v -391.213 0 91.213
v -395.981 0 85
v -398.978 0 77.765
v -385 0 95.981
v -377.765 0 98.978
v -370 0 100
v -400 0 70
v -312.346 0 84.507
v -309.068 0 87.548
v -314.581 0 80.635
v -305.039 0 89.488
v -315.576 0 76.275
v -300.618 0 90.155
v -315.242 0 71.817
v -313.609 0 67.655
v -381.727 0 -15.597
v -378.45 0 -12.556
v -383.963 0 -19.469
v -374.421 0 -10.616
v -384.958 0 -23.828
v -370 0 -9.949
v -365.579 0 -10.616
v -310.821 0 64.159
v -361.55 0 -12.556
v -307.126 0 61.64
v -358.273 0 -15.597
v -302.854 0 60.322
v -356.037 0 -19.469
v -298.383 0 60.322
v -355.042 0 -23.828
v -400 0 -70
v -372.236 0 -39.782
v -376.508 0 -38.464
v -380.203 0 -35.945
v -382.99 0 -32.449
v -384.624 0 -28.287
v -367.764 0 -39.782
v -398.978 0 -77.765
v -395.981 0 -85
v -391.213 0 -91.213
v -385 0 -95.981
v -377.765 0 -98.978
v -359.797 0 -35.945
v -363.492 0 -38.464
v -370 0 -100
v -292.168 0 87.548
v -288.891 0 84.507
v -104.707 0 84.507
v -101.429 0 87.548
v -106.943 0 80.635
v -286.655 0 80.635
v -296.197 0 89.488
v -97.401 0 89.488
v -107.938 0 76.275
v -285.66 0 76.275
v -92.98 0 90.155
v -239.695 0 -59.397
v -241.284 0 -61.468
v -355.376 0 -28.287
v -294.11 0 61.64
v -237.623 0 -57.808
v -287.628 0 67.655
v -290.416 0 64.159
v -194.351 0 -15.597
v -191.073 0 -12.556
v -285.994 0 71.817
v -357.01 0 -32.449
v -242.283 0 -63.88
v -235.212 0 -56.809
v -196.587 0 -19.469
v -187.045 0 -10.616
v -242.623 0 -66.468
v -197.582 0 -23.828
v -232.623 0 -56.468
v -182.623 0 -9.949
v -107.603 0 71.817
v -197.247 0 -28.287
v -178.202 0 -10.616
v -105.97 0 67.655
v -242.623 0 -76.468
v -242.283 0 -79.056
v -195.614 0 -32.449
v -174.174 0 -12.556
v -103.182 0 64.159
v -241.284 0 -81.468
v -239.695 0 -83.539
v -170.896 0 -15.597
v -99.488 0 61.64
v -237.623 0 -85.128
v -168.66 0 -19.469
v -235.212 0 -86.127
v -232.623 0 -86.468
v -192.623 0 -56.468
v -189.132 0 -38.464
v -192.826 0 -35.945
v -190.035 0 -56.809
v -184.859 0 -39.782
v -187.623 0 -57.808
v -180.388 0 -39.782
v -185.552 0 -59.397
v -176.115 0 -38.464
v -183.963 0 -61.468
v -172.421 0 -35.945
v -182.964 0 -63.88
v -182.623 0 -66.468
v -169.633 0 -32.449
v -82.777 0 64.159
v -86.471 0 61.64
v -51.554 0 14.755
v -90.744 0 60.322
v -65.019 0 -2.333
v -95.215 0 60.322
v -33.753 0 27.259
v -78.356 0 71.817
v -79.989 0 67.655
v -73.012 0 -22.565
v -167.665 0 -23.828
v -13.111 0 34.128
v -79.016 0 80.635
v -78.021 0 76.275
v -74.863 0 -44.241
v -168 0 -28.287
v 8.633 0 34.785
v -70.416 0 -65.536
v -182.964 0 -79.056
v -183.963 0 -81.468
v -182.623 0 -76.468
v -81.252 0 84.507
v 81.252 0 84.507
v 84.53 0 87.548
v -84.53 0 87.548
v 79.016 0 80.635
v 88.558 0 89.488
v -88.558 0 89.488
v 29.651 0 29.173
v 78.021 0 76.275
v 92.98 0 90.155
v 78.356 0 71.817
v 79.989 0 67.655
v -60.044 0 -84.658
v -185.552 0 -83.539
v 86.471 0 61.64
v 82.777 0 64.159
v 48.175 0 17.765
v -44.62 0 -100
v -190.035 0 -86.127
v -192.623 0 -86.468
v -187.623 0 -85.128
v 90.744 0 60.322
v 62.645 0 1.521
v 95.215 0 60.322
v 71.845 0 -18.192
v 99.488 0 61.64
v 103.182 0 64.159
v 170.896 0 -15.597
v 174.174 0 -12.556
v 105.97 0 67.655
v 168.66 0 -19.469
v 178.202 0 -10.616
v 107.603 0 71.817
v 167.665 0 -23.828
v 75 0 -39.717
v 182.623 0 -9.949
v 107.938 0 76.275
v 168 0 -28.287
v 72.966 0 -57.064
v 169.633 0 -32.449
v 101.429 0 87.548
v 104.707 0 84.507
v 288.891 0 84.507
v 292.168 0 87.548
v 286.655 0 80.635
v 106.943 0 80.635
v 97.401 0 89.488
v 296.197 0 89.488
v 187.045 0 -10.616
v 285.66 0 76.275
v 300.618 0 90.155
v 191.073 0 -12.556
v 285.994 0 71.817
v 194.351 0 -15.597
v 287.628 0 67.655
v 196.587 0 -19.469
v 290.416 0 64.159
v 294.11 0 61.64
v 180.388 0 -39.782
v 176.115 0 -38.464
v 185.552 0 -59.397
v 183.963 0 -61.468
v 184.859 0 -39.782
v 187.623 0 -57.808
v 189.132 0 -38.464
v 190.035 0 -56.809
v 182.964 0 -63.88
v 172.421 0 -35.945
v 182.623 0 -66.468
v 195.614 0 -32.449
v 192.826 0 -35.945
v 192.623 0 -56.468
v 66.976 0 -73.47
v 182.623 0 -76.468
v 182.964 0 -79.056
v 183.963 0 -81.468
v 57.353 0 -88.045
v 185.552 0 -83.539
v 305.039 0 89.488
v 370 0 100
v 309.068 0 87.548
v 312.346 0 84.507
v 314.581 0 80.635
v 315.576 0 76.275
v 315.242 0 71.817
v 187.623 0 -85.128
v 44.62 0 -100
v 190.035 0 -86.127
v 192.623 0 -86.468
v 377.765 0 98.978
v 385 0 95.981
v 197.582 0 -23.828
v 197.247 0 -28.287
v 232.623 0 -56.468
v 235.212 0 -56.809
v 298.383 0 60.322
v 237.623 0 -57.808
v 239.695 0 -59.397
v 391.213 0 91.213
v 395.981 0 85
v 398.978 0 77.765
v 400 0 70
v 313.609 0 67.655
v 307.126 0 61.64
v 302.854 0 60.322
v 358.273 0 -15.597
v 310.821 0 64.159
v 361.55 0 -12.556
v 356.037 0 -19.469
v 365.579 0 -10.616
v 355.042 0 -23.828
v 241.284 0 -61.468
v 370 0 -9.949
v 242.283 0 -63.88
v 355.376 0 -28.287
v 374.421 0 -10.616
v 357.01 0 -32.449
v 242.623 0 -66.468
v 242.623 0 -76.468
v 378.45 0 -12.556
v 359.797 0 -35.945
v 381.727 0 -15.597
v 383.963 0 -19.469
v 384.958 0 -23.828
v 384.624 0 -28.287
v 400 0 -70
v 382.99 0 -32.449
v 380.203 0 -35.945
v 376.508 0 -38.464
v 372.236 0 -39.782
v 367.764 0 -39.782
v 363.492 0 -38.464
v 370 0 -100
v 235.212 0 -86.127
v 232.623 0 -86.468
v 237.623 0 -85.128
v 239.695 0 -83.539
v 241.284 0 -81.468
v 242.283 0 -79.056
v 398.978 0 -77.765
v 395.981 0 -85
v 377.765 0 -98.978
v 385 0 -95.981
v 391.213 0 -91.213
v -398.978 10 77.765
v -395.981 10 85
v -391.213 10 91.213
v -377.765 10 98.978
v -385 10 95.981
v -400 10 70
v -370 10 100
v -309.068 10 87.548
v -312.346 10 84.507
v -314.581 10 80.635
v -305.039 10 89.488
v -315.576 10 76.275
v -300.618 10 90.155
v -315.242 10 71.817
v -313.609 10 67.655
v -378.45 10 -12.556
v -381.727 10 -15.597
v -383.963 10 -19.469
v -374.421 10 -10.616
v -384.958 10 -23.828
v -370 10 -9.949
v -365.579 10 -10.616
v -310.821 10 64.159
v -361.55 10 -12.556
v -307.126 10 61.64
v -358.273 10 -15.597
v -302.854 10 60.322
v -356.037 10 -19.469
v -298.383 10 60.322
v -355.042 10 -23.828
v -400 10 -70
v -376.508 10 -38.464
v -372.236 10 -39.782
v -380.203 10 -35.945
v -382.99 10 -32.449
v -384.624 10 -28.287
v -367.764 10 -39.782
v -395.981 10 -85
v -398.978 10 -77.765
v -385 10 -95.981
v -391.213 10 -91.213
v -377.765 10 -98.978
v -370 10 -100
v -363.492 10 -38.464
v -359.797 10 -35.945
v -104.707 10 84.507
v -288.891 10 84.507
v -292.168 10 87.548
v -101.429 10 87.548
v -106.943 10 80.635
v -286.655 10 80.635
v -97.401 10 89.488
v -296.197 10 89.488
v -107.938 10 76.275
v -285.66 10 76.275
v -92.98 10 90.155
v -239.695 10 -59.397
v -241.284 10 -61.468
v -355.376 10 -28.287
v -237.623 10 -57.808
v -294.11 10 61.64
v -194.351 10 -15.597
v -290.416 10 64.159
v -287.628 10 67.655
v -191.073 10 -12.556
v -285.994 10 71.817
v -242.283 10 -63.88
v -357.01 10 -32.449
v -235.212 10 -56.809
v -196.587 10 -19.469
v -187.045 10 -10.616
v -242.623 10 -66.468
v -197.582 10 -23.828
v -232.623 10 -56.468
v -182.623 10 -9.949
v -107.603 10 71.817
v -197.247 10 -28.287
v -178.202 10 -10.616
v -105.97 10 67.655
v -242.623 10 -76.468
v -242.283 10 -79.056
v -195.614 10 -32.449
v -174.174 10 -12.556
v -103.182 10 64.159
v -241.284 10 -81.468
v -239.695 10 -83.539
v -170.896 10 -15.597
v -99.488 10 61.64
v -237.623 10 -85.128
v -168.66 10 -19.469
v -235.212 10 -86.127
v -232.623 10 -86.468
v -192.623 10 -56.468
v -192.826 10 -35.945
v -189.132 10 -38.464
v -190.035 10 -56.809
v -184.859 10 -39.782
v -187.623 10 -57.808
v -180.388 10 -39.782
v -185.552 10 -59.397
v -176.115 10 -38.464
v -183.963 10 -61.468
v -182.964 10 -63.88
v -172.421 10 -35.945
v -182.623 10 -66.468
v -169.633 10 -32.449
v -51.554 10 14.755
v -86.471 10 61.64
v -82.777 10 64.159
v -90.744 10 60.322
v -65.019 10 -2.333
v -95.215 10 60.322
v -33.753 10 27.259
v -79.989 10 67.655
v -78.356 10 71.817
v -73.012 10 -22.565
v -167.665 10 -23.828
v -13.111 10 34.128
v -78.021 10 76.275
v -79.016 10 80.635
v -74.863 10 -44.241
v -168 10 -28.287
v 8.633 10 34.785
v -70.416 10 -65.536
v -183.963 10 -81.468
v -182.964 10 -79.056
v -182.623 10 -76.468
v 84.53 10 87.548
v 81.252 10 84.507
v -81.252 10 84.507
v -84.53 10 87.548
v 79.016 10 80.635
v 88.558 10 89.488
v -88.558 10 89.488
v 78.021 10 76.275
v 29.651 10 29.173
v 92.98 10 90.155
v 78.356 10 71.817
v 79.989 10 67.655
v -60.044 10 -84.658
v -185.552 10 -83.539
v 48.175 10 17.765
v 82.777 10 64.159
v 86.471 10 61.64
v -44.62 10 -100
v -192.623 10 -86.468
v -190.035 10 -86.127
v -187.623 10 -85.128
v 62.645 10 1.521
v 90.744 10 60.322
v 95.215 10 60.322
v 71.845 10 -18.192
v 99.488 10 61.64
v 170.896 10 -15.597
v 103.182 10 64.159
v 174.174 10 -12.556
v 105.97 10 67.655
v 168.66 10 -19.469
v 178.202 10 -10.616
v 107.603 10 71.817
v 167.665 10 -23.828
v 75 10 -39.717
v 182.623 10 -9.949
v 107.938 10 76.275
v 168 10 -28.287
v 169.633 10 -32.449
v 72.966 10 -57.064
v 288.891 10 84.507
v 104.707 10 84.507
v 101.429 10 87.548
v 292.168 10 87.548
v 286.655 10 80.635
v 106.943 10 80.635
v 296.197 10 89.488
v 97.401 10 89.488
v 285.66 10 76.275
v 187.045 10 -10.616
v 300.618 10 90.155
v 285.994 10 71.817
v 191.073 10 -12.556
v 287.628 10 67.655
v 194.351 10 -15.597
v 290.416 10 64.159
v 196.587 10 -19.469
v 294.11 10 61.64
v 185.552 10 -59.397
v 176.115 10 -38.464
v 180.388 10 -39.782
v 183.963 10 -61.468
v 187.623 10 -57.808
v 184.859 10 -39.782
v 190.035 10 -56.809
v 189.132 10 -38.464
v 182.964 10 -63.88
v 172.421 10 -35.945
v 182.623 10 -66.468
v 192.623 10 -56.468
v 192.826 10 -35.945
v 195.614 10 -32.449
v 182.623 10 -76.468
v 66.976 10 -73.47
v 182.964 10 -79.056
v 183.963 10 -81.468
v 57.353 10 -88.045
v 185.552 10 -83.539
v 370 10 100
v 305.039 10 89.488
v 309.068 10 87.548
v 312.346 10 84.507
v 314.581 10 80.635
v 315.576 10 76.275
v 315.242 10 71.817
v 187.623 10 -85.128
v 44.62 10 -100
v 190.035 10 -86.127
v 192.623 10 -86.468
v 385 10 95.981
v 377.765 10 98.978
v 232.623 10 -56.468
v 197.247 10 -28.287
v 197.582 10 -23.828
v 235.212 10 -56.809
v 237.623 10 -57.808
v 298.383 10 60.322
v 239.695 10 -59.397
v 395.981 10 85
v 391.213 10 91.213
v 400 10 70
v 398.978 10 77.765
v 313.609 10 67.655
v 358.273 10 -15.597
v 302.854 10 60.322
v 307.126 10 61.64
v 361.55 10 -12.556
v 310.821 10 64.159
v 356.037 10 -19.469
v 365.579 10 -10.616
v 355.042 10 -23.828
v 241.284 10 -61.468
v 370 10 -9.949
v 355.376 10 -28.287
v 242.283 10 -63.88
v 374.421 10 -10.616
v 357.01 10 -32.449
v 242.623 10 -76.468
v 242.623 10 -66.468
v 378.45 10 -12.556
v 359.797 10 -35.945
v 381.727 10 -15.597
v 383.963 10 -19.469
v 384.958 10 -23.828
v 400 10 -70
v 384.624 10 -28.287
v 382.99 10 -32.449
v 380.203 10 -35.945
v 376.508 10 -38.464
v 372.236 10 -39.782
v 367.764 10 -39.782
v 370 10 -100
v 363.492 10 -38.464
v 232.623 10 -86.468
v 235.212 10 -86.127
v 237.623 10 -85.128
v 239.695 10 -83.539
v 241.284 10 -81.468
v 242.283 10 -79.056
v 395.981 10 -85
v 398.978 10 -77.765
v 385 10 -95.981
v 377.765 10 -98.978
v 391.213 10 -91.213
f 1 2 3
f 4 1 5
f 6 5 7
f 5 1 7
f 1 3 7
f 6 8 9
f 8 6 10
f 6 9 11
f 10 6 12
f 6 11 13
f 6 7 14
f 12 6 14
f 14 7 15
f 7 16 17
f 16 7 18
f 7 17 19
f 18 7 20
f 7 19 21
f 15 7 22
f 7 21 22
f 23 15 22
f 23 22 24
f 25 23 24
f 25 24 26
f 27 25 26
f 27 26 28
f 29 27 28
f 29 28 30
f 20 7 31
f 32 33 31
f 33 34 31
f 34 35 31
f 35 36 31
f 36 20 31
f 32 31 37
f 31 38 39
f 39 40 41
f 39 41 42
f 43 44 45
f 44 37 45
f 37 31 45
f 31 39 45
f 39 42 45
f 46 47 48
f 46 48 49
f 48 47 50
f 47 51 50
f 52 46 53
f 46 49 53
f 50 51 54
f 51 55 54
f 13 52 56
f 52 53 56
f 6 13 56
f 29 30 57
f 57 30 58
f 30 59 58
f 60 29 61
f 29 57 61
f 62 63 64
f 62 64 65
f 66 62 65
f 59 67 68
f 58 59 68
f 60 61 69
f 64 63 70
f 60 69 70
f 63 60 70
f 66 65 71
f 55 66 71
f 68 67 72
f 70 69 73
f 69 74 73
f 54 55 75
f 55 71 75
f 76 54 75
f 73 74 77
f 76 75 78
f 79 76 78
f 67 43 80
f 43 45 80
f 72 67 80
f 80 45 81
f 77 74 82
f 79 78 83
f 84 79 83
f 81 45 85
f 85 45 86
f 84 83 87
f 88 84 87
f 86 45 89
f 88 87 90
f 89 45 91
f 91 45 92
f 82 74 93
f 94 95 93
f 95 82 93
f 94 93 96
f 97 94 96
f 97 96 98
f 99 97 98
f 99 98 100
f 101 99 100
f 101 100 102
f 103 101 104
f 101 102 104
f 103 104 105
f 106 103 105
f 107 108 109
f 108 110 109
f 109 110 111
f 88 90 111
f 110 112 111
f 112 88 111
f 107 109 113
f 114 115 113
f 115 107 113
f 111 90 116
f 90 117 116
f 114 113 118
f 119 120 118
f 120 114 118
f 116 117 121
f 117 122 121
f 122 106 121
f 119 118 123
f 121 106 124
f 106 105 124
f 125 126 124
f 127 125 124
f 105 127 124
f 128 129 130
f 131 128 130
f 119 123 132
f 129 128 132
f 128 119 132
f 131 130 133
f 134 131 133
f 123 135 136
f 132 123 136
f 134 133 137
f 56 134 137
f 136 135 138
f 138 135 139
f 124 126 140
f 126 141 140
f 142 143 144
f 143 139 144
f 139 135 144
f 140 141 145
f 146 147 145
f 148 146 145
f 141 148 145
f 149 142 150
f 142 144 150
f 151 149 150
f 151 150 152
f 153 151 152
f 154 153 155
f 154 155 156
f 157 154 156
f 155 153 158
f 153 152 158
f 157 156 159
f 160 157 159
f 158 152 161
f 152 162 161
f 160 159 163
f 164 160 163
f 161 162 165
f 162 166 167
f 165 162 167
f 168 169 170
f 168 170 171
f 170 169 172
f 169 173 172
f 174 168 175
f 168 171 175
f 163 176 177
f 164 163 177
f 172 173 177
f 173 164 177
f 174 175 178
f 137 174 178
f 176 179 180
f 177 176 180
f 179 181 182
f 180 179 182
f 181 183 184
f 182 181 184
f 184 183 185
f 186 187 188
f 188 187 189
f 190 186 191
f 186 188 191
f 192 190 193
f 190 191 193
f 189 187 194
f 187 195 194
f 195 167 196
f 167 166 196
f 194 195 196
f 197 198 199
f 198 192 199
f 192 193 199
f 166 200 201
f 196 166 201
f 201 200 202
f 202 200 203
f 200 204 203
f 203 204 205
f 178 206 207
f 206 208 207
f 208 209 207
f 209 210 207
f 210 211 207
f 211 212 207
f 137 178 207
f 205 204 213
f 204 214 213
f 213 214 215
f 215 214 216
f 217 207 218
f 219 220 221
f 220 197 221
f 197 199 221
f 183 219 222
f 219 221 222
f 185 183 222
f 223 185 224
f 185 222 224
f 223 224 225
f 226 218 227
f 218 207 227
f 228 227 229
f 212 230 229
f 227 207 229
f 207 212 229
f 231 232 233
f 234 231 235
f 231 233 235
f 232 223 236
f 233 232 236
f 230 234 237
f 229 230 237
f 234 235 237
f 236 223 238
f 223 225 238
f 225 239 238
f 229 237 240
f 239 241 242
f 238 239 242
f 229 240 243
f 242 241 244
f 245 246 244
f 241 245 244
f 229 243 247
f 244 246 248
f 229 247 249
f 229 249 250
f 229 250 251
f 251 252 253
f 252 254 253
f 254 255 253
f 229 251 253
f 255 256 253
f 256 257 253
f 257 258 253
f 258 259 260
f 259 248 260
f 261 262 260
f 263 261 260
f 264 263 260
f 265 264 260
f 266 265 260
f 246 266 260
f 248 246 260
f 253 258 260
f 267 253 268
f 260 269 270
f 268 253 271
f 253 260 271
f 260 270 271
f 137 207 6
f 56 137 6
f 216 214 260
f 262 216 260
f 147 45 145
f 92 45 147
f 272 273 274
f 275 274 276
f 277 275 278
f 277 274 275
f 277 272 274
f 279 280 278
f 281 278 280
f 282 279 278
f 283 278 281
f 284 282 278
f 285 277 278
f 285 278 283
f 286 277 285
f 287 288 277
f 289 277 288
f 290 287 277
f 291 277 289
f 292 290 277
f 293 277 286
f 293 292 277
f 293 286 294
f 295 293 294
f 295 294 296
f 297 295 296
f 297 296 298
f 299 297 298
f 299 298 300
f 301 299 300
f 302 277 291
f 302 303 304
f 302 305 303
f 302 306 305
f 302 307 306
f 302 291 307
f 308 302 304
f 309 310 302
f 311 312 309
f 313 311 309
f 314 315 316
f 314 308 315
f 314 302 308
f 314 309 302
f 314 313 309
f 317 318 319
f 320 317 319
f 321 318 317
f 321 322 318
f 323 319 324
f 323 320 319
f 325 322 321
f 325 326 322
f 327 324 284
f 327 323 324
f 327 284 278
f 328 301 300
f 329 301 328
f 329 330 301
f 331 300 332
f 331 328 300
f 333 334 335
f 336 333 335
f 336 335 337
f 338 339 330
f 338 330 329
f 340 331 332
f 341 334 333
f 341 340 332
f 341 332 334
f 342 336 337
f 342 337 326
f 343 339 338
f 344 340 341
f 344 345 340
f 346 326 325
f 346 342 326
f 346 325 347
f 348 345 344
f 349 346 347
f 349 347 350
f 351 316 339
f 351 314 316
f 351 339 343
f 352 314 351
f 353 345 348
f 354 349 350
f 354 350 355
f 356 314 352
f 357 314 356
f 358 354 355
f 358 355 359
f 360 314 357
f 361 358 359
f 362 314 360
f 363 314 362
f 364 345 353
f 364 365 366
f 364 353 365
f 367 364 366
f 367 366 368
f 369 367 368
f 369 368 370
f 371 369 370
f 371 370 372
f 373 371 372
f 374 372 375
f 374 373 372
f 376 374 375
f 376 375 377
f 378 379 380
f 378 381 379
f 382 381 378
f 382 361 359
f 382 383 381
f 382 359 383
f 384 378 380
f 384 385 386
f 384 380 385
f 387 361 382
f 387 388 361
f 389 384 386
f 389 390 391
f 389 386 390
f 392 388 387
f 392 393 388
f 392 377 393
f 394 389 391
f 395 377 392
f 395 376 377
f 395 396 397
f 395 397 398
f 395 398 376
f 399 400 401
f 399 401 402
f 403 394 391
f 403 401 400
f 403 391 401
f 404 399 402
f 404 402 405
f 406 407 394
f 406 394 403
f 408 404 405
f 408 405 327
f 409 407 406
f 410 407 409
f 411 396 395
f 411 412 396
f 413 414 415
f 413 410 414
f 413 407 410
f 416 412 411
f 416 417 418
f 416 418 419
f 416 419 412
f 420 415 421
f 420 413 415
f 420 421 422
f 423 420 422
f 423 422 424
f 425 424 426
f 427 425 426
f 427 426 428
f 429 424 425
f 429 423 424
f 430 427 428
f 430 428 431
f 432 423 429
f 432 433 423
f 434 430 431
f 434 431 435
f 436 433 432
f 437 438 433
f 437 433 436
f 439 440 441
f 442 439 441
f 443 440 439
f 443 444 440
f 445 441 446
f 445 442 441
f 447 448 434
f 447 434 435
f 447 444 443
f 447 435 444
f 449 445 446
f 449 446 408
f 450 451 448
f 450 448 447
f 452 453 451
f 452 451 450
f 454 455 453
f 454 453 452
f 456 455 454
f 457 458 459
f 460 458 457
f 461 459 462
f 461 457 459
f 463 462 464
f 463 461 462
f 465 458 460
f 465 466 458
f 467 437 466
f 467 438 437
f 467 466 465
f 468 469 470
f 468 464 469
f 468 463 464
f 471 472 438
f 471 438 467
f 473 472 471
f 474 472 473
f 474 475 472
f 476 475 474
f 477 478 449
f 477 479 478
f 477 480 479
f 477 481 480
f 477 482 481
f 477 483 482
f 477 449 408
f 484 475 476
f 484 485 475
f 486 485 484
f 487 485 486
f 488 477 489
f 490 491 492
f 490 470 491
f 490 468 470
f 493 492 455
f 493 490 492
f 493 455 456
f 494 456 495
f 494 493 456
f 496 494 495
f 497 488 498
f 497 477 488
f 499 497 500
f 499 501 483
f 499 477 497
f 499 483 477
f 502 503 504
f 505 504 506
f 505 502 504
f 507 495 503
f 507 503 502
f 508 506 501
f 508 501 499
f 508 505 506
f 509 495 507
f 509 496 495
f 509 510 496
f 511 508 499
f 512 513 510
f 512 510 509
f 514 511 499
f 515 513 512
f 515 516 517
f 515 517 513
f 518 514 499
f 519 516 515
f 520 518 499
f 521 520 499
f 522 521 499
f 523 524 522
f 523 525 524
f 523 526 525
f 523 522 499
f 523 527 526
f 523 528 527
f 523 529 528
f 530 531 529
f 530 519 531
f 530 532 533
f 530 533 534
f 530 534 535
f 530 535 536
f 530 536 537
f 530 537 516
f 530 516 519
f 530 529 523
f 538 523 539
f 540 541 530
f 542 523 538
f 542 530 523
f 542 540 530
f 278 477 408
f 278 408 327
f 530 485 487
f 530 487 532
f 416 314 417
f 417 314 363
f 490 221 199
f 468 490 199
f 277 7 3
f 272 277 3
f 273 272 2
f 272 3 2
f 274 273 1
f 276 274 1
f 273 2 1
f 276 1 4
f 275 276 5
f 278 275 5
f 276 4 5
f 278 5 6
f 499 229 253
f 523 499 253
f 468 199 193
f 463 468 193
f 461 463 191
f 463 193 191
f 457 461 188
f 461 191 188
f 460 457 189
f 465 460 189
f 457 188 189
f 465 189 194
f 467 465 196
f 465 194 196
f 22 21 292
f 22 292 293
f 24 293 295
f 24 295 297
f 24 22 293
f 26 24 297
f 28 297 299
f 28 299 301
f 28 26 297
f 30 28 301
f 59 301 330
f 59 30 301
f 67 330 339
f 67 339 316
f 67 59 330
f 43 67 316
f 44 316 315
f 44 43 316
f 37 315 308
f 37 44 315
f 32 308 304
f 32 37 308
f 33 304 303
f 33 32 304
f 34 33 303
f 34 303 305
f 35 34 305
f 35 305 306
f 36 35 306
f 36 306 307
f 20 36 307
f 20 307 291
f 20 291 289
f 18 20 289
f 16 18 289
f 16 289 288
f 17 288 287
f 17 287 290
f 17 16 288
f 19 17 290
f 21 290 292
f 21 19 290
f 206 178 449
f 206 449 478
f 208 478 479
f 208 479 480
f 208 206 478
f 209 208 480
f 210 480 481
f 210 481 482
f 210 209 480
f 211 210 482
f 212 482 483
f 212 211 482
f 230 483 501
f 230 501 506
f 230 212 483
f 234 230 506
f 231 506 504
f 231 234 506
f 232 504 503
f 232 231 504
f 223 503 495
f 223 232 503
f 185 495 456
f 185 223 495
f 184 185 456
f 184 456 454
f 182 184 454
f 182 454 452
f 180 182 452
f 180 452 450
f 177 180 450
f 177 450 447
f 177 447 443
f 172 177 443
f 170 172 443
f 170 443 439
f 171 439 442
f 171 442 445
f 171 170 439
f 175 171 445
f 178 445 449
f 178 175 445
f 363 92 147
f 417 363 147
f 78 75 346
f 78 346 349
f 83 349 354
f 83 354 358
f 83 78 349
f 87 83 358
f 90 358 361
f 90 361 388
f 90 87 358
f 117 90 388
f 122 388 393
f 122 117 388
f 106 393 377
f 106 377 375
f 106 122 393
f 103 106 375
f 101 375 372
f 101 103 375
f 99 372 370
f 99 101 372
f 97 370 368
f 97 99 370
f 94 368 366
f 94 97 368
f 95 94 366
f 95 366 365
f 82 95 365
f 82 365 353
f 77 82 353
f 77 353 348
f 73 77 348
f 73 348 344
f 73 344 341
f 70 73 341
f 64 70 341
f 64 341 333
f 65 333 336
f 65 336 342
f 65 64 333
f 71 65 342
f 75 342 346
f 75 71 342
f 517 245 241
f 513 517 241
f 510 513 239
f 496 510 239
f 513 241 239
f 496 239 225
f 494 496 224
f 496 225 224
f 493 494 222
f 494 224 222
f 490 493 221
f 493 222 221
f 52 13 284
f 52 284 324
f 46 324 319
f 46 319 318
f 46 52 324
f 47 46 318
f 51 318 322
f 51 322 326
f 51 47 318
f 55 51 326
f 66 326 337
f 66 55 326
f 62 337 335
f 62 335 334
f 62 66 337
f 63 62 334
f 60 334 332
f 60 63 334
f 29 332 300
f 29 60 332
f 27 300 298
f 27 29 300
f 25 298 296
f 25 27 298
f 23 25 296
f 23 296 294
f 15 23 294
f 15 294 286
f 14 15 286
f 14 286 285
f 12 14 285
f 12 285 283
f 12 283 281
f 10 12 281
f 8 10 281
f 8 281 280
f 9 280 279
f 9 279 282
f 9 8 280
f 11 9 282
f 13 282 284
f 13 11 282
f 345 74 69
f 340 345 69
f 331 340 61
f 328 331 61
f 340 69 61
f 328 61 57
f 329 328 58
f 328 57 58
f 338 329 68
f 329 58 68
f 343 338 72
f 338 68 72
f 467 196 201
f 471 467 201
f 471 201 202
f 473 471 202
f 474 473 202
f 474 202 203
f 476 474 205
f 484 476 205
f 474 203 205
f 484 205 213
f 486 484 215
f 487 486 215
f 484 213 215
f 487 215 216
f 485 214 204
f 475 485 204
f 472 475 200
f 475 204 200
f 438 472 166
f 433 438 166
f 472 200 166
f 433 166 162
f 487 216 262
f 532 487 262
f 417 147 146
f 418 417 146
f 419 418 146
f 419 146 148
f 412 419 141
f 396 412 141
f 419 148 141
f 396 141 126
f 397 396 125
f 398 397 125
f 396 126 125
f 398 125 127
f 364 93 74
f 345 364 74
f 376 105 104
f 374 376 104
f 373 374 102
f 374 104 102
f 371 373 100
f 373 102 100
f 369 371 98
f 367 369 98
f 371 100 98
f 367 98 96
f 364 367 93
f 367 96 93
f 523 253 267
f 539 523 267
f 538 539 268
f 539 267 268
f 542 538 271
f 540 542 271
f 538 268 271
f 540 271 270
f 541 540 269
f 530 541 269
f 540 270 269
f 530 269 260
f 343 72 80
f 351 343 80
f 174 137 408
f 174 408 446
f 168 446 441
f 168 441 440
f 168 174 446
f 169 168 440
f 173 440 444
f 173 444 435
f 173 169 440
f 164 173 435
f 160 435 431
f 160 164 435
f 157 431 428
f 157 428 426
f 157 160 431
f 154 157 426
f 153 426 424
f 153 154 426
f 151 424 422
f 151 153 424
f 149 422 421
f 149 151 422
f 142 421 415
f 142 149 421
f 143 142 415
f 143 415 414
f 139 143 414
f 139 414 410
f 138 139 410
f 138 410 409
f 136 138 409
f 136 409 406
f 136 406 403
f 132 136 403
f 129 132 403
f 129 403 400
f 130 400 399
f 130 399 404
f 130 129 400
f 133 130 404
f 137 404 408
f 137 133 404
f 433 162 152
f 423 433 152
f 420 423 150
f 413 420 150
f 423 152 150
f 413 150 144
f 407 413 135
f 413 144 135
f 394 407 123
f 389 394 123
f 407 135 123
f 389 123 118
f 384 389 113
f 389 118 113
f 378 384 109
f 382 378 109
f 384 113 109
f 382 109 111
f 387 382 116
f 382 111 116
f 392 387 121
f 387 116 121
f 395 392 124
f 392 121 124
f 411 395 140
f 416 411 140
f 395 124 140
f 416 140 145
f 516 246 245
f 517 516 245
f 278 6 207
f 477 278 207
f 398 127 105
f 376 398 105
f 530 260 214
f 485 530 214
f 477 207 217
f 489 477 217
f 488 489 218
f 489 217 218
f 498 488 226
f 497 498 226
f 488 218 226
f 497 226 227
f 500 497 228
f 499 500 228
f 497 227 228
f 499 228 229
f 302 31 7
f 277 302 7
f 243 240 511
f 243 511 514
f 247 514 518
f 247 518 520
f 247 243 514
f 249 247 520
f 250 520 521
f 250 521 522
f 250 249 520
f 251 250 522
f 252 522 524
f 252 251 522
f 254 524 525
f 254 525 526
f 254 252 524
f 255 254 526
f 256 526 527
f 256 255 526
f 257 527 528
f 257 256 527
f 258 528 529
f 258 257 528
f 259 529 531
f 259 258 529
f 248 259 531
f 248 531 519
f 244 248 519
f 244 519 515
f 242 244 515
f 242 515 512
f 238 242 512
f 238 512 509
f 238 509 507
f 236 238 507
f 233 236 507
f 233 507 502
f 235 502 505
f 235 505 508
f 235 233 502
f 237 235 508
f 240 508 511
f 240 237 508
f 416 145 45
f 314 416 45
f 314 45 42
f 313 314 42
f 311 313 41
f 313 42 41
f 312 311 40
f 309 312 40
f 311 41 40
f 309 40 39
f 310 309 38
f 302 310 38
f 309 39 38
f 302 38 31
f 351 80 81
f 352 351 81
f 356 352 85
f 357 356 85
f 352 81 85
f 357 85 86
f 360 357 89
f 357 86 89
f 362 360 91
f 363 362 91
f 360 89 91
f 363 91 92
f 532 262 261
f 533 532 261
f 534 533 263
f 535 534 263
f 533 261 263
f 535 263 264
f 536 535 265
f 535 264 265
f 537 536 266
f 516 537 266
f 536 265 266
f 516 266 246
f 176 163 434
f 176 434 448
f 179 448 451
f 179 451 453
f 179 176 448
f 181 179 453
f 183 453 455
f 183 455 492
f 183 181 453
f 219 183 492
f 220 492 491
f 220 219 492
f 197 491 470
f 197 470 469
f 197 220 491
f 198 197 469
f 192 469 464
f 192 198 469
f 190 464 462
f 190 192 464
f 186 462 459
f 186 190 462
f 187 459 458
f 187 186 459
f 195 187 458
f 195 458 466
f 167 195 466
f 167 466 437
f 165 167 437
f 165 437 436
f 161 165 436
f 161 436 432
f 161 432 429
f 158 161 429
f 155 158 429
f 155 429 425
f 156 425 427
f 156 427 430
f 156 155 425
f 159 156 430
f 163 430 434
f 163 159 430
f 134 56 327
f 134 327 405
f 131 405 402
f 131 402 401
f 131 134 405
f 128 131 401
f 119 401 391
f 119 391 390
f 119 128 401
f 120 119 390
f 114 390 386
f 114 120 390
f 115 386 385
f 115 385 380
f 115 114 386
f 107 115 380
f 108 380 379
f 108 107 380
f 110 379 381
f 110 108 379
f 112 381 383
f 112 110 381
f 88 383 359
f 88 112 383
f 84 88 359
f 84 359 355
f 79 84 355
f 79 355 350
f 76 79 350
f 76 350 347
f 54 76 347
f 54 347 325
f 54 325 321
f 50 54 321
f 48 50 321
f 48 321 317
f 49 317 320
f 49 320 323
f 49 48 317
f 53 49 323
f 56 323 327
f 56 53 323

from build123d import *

# Parameters (mm, degrees)
SKETCH1_R           = 15
BOSS_EXTRUDE1_DEPTH = 10


with BuildPart() as part:
    # Sketch1 → Boss-Extrude1 (new body)
    with BuildSketch(Plane(origin=(0, 0, 0), x_dir=(1, 0, 0), z_dir=(0, 1, 0))):
        with BuildLine():
            Line((-370, -100), (370, -100))
            ThreePointArc((370, -100), (391.213203436, -91.213203436), (400, -70))
            Line((400, -70), (400, 70))
            ThreePointArc((400, 70), (391.213203436, 91.213203436), (370, 100))
            Line((370, 100), (44.619962618, 100))
            ThreePointArc((44.619962618, 100), (66.975731412, 73.469642109), (75, 39.716843679))
            ThreePointArc((75, 39.716843679), (-33.75279843, -27.258887733), (-44.619962618, 100))
            Line((-44.619962618, 100), (-370, 100))
            ThreePointArc((-370, 100), (-391.213203436, 91.213203436), (-400, 70))
            Line((-400, 70), (-400, -70))
            ThreePointArc((-400, -70), (-391.213203436, -91.213203436), (-370, -100))
        make_face()
        with Locations(Location((-300.6181604, -75.1545401, 0), (0, 0, 270))):
            Circle(SKETCH1_R, mode=Mode.SUBTRACT)
        with Locations(Location((-92.979550381, -75.1545401, 0), (0, 0, 270))):
            Circle(SKETCH1_R, mode=Mode.SUBTRACT)
        with Locations(Location((92.979550381, -75.1545401, 0), (0, 0, 270))):
            Circle(SKETCH1_R, mode=Mode.SUBTRACT)
        with Locations(Location((300.6181604, -75.1545401, 0), (0, 0, 270))):
            Circle(SKETCH1_R, mode=Mode.SUBTRACT)
        with Locations(Location((-370, 24.949199623, 0), (0, 0, 270))):
            Circle(SKETCH1_R, mode=Mode.SUBTRACT)
        with Locations(Location((-182.623487934, 24.949199623, 0), (0, 0, 270))):
            Circle(SKETCH1_R, mode=Mode.SUBTRACT)
        with BuildLine():
            ThreePointArc((-242.623487934, 76.468107678), (-239.694555745, 83.53917549), (-232.623487934, 86.468107678))
            Line((-232.623487934, 86.468107678), (-192.623487934, 86.468107678))
            ThreePointArc((-192.623487934, 86.468107678), (-185.552420122, 83.53917549), (-182.623487934, 76.468107678))
            Line((-182.623487934, 76.468107678), (-182.623487934, 66.468107678))
            ThreePointArc((-182.623487934, 66.468107678), (-185.552420122, 59.397039866), (-192.623487934, 56.468107678))
            Line((-192.623487934, 56.468107678), (-232.623487934, 56.468107678))
            ThreePointArc((-232.623487934, 56.468107678), (-239.694555745, 59.397039866), (-242.623487934, 66.468107678))
            Line((-242.623487934, 66.468107678), (-242.623487934, 76.468107678))
        make_face(mode=Mode.SUBTRACT)
        with Locations(Location((182.623487934, 24.949199623, 0), (0, 0, 270))):
            Circle(SKETCH1_R, mode=Mode.SUBTRACT)
        with Locations(Location((370, 24.949199623, 0), (0, 0, 270))):
            Circle(SKETCH1_R, mode=Mode.SUBTRACT)
        with BuildLine():
            ThreePointArc((242.623487934, 66.468107678), (239.694555745, 59.397039866), (232.623487934, 56.468107678))
            Line((232.623487934, 56.468107678), (192.623487934, 56.468107678))
            ThreePointArc((192.623487934, 56.468107678), (185.552420122, 59.397039866), (182.623487934, 66.468107678))
            Line((182.623487934, 66.468107678), (182.623487934, 76.468107678))
            ThreePointArc((182.623487934, 76.468107678), (185.552420122, 83.53917549), (192.623487934, 86.468107678))
            Line((192.623487934, 86.468107678), (232.623487934, 86.468107678))
            ThreePointArc((232.623487934, 86.468107678), (239.694555745, 83.53917549), (242.623487934, 76.468107678))
            Line((242.623487934, 76.468107678), (242.623487934, 66.468107678))
        make_face(mode=Mode.SUBTRACT)
    extrude(amount=BOSS_EXTRUDE1_DEPTH)


solid = part.part
